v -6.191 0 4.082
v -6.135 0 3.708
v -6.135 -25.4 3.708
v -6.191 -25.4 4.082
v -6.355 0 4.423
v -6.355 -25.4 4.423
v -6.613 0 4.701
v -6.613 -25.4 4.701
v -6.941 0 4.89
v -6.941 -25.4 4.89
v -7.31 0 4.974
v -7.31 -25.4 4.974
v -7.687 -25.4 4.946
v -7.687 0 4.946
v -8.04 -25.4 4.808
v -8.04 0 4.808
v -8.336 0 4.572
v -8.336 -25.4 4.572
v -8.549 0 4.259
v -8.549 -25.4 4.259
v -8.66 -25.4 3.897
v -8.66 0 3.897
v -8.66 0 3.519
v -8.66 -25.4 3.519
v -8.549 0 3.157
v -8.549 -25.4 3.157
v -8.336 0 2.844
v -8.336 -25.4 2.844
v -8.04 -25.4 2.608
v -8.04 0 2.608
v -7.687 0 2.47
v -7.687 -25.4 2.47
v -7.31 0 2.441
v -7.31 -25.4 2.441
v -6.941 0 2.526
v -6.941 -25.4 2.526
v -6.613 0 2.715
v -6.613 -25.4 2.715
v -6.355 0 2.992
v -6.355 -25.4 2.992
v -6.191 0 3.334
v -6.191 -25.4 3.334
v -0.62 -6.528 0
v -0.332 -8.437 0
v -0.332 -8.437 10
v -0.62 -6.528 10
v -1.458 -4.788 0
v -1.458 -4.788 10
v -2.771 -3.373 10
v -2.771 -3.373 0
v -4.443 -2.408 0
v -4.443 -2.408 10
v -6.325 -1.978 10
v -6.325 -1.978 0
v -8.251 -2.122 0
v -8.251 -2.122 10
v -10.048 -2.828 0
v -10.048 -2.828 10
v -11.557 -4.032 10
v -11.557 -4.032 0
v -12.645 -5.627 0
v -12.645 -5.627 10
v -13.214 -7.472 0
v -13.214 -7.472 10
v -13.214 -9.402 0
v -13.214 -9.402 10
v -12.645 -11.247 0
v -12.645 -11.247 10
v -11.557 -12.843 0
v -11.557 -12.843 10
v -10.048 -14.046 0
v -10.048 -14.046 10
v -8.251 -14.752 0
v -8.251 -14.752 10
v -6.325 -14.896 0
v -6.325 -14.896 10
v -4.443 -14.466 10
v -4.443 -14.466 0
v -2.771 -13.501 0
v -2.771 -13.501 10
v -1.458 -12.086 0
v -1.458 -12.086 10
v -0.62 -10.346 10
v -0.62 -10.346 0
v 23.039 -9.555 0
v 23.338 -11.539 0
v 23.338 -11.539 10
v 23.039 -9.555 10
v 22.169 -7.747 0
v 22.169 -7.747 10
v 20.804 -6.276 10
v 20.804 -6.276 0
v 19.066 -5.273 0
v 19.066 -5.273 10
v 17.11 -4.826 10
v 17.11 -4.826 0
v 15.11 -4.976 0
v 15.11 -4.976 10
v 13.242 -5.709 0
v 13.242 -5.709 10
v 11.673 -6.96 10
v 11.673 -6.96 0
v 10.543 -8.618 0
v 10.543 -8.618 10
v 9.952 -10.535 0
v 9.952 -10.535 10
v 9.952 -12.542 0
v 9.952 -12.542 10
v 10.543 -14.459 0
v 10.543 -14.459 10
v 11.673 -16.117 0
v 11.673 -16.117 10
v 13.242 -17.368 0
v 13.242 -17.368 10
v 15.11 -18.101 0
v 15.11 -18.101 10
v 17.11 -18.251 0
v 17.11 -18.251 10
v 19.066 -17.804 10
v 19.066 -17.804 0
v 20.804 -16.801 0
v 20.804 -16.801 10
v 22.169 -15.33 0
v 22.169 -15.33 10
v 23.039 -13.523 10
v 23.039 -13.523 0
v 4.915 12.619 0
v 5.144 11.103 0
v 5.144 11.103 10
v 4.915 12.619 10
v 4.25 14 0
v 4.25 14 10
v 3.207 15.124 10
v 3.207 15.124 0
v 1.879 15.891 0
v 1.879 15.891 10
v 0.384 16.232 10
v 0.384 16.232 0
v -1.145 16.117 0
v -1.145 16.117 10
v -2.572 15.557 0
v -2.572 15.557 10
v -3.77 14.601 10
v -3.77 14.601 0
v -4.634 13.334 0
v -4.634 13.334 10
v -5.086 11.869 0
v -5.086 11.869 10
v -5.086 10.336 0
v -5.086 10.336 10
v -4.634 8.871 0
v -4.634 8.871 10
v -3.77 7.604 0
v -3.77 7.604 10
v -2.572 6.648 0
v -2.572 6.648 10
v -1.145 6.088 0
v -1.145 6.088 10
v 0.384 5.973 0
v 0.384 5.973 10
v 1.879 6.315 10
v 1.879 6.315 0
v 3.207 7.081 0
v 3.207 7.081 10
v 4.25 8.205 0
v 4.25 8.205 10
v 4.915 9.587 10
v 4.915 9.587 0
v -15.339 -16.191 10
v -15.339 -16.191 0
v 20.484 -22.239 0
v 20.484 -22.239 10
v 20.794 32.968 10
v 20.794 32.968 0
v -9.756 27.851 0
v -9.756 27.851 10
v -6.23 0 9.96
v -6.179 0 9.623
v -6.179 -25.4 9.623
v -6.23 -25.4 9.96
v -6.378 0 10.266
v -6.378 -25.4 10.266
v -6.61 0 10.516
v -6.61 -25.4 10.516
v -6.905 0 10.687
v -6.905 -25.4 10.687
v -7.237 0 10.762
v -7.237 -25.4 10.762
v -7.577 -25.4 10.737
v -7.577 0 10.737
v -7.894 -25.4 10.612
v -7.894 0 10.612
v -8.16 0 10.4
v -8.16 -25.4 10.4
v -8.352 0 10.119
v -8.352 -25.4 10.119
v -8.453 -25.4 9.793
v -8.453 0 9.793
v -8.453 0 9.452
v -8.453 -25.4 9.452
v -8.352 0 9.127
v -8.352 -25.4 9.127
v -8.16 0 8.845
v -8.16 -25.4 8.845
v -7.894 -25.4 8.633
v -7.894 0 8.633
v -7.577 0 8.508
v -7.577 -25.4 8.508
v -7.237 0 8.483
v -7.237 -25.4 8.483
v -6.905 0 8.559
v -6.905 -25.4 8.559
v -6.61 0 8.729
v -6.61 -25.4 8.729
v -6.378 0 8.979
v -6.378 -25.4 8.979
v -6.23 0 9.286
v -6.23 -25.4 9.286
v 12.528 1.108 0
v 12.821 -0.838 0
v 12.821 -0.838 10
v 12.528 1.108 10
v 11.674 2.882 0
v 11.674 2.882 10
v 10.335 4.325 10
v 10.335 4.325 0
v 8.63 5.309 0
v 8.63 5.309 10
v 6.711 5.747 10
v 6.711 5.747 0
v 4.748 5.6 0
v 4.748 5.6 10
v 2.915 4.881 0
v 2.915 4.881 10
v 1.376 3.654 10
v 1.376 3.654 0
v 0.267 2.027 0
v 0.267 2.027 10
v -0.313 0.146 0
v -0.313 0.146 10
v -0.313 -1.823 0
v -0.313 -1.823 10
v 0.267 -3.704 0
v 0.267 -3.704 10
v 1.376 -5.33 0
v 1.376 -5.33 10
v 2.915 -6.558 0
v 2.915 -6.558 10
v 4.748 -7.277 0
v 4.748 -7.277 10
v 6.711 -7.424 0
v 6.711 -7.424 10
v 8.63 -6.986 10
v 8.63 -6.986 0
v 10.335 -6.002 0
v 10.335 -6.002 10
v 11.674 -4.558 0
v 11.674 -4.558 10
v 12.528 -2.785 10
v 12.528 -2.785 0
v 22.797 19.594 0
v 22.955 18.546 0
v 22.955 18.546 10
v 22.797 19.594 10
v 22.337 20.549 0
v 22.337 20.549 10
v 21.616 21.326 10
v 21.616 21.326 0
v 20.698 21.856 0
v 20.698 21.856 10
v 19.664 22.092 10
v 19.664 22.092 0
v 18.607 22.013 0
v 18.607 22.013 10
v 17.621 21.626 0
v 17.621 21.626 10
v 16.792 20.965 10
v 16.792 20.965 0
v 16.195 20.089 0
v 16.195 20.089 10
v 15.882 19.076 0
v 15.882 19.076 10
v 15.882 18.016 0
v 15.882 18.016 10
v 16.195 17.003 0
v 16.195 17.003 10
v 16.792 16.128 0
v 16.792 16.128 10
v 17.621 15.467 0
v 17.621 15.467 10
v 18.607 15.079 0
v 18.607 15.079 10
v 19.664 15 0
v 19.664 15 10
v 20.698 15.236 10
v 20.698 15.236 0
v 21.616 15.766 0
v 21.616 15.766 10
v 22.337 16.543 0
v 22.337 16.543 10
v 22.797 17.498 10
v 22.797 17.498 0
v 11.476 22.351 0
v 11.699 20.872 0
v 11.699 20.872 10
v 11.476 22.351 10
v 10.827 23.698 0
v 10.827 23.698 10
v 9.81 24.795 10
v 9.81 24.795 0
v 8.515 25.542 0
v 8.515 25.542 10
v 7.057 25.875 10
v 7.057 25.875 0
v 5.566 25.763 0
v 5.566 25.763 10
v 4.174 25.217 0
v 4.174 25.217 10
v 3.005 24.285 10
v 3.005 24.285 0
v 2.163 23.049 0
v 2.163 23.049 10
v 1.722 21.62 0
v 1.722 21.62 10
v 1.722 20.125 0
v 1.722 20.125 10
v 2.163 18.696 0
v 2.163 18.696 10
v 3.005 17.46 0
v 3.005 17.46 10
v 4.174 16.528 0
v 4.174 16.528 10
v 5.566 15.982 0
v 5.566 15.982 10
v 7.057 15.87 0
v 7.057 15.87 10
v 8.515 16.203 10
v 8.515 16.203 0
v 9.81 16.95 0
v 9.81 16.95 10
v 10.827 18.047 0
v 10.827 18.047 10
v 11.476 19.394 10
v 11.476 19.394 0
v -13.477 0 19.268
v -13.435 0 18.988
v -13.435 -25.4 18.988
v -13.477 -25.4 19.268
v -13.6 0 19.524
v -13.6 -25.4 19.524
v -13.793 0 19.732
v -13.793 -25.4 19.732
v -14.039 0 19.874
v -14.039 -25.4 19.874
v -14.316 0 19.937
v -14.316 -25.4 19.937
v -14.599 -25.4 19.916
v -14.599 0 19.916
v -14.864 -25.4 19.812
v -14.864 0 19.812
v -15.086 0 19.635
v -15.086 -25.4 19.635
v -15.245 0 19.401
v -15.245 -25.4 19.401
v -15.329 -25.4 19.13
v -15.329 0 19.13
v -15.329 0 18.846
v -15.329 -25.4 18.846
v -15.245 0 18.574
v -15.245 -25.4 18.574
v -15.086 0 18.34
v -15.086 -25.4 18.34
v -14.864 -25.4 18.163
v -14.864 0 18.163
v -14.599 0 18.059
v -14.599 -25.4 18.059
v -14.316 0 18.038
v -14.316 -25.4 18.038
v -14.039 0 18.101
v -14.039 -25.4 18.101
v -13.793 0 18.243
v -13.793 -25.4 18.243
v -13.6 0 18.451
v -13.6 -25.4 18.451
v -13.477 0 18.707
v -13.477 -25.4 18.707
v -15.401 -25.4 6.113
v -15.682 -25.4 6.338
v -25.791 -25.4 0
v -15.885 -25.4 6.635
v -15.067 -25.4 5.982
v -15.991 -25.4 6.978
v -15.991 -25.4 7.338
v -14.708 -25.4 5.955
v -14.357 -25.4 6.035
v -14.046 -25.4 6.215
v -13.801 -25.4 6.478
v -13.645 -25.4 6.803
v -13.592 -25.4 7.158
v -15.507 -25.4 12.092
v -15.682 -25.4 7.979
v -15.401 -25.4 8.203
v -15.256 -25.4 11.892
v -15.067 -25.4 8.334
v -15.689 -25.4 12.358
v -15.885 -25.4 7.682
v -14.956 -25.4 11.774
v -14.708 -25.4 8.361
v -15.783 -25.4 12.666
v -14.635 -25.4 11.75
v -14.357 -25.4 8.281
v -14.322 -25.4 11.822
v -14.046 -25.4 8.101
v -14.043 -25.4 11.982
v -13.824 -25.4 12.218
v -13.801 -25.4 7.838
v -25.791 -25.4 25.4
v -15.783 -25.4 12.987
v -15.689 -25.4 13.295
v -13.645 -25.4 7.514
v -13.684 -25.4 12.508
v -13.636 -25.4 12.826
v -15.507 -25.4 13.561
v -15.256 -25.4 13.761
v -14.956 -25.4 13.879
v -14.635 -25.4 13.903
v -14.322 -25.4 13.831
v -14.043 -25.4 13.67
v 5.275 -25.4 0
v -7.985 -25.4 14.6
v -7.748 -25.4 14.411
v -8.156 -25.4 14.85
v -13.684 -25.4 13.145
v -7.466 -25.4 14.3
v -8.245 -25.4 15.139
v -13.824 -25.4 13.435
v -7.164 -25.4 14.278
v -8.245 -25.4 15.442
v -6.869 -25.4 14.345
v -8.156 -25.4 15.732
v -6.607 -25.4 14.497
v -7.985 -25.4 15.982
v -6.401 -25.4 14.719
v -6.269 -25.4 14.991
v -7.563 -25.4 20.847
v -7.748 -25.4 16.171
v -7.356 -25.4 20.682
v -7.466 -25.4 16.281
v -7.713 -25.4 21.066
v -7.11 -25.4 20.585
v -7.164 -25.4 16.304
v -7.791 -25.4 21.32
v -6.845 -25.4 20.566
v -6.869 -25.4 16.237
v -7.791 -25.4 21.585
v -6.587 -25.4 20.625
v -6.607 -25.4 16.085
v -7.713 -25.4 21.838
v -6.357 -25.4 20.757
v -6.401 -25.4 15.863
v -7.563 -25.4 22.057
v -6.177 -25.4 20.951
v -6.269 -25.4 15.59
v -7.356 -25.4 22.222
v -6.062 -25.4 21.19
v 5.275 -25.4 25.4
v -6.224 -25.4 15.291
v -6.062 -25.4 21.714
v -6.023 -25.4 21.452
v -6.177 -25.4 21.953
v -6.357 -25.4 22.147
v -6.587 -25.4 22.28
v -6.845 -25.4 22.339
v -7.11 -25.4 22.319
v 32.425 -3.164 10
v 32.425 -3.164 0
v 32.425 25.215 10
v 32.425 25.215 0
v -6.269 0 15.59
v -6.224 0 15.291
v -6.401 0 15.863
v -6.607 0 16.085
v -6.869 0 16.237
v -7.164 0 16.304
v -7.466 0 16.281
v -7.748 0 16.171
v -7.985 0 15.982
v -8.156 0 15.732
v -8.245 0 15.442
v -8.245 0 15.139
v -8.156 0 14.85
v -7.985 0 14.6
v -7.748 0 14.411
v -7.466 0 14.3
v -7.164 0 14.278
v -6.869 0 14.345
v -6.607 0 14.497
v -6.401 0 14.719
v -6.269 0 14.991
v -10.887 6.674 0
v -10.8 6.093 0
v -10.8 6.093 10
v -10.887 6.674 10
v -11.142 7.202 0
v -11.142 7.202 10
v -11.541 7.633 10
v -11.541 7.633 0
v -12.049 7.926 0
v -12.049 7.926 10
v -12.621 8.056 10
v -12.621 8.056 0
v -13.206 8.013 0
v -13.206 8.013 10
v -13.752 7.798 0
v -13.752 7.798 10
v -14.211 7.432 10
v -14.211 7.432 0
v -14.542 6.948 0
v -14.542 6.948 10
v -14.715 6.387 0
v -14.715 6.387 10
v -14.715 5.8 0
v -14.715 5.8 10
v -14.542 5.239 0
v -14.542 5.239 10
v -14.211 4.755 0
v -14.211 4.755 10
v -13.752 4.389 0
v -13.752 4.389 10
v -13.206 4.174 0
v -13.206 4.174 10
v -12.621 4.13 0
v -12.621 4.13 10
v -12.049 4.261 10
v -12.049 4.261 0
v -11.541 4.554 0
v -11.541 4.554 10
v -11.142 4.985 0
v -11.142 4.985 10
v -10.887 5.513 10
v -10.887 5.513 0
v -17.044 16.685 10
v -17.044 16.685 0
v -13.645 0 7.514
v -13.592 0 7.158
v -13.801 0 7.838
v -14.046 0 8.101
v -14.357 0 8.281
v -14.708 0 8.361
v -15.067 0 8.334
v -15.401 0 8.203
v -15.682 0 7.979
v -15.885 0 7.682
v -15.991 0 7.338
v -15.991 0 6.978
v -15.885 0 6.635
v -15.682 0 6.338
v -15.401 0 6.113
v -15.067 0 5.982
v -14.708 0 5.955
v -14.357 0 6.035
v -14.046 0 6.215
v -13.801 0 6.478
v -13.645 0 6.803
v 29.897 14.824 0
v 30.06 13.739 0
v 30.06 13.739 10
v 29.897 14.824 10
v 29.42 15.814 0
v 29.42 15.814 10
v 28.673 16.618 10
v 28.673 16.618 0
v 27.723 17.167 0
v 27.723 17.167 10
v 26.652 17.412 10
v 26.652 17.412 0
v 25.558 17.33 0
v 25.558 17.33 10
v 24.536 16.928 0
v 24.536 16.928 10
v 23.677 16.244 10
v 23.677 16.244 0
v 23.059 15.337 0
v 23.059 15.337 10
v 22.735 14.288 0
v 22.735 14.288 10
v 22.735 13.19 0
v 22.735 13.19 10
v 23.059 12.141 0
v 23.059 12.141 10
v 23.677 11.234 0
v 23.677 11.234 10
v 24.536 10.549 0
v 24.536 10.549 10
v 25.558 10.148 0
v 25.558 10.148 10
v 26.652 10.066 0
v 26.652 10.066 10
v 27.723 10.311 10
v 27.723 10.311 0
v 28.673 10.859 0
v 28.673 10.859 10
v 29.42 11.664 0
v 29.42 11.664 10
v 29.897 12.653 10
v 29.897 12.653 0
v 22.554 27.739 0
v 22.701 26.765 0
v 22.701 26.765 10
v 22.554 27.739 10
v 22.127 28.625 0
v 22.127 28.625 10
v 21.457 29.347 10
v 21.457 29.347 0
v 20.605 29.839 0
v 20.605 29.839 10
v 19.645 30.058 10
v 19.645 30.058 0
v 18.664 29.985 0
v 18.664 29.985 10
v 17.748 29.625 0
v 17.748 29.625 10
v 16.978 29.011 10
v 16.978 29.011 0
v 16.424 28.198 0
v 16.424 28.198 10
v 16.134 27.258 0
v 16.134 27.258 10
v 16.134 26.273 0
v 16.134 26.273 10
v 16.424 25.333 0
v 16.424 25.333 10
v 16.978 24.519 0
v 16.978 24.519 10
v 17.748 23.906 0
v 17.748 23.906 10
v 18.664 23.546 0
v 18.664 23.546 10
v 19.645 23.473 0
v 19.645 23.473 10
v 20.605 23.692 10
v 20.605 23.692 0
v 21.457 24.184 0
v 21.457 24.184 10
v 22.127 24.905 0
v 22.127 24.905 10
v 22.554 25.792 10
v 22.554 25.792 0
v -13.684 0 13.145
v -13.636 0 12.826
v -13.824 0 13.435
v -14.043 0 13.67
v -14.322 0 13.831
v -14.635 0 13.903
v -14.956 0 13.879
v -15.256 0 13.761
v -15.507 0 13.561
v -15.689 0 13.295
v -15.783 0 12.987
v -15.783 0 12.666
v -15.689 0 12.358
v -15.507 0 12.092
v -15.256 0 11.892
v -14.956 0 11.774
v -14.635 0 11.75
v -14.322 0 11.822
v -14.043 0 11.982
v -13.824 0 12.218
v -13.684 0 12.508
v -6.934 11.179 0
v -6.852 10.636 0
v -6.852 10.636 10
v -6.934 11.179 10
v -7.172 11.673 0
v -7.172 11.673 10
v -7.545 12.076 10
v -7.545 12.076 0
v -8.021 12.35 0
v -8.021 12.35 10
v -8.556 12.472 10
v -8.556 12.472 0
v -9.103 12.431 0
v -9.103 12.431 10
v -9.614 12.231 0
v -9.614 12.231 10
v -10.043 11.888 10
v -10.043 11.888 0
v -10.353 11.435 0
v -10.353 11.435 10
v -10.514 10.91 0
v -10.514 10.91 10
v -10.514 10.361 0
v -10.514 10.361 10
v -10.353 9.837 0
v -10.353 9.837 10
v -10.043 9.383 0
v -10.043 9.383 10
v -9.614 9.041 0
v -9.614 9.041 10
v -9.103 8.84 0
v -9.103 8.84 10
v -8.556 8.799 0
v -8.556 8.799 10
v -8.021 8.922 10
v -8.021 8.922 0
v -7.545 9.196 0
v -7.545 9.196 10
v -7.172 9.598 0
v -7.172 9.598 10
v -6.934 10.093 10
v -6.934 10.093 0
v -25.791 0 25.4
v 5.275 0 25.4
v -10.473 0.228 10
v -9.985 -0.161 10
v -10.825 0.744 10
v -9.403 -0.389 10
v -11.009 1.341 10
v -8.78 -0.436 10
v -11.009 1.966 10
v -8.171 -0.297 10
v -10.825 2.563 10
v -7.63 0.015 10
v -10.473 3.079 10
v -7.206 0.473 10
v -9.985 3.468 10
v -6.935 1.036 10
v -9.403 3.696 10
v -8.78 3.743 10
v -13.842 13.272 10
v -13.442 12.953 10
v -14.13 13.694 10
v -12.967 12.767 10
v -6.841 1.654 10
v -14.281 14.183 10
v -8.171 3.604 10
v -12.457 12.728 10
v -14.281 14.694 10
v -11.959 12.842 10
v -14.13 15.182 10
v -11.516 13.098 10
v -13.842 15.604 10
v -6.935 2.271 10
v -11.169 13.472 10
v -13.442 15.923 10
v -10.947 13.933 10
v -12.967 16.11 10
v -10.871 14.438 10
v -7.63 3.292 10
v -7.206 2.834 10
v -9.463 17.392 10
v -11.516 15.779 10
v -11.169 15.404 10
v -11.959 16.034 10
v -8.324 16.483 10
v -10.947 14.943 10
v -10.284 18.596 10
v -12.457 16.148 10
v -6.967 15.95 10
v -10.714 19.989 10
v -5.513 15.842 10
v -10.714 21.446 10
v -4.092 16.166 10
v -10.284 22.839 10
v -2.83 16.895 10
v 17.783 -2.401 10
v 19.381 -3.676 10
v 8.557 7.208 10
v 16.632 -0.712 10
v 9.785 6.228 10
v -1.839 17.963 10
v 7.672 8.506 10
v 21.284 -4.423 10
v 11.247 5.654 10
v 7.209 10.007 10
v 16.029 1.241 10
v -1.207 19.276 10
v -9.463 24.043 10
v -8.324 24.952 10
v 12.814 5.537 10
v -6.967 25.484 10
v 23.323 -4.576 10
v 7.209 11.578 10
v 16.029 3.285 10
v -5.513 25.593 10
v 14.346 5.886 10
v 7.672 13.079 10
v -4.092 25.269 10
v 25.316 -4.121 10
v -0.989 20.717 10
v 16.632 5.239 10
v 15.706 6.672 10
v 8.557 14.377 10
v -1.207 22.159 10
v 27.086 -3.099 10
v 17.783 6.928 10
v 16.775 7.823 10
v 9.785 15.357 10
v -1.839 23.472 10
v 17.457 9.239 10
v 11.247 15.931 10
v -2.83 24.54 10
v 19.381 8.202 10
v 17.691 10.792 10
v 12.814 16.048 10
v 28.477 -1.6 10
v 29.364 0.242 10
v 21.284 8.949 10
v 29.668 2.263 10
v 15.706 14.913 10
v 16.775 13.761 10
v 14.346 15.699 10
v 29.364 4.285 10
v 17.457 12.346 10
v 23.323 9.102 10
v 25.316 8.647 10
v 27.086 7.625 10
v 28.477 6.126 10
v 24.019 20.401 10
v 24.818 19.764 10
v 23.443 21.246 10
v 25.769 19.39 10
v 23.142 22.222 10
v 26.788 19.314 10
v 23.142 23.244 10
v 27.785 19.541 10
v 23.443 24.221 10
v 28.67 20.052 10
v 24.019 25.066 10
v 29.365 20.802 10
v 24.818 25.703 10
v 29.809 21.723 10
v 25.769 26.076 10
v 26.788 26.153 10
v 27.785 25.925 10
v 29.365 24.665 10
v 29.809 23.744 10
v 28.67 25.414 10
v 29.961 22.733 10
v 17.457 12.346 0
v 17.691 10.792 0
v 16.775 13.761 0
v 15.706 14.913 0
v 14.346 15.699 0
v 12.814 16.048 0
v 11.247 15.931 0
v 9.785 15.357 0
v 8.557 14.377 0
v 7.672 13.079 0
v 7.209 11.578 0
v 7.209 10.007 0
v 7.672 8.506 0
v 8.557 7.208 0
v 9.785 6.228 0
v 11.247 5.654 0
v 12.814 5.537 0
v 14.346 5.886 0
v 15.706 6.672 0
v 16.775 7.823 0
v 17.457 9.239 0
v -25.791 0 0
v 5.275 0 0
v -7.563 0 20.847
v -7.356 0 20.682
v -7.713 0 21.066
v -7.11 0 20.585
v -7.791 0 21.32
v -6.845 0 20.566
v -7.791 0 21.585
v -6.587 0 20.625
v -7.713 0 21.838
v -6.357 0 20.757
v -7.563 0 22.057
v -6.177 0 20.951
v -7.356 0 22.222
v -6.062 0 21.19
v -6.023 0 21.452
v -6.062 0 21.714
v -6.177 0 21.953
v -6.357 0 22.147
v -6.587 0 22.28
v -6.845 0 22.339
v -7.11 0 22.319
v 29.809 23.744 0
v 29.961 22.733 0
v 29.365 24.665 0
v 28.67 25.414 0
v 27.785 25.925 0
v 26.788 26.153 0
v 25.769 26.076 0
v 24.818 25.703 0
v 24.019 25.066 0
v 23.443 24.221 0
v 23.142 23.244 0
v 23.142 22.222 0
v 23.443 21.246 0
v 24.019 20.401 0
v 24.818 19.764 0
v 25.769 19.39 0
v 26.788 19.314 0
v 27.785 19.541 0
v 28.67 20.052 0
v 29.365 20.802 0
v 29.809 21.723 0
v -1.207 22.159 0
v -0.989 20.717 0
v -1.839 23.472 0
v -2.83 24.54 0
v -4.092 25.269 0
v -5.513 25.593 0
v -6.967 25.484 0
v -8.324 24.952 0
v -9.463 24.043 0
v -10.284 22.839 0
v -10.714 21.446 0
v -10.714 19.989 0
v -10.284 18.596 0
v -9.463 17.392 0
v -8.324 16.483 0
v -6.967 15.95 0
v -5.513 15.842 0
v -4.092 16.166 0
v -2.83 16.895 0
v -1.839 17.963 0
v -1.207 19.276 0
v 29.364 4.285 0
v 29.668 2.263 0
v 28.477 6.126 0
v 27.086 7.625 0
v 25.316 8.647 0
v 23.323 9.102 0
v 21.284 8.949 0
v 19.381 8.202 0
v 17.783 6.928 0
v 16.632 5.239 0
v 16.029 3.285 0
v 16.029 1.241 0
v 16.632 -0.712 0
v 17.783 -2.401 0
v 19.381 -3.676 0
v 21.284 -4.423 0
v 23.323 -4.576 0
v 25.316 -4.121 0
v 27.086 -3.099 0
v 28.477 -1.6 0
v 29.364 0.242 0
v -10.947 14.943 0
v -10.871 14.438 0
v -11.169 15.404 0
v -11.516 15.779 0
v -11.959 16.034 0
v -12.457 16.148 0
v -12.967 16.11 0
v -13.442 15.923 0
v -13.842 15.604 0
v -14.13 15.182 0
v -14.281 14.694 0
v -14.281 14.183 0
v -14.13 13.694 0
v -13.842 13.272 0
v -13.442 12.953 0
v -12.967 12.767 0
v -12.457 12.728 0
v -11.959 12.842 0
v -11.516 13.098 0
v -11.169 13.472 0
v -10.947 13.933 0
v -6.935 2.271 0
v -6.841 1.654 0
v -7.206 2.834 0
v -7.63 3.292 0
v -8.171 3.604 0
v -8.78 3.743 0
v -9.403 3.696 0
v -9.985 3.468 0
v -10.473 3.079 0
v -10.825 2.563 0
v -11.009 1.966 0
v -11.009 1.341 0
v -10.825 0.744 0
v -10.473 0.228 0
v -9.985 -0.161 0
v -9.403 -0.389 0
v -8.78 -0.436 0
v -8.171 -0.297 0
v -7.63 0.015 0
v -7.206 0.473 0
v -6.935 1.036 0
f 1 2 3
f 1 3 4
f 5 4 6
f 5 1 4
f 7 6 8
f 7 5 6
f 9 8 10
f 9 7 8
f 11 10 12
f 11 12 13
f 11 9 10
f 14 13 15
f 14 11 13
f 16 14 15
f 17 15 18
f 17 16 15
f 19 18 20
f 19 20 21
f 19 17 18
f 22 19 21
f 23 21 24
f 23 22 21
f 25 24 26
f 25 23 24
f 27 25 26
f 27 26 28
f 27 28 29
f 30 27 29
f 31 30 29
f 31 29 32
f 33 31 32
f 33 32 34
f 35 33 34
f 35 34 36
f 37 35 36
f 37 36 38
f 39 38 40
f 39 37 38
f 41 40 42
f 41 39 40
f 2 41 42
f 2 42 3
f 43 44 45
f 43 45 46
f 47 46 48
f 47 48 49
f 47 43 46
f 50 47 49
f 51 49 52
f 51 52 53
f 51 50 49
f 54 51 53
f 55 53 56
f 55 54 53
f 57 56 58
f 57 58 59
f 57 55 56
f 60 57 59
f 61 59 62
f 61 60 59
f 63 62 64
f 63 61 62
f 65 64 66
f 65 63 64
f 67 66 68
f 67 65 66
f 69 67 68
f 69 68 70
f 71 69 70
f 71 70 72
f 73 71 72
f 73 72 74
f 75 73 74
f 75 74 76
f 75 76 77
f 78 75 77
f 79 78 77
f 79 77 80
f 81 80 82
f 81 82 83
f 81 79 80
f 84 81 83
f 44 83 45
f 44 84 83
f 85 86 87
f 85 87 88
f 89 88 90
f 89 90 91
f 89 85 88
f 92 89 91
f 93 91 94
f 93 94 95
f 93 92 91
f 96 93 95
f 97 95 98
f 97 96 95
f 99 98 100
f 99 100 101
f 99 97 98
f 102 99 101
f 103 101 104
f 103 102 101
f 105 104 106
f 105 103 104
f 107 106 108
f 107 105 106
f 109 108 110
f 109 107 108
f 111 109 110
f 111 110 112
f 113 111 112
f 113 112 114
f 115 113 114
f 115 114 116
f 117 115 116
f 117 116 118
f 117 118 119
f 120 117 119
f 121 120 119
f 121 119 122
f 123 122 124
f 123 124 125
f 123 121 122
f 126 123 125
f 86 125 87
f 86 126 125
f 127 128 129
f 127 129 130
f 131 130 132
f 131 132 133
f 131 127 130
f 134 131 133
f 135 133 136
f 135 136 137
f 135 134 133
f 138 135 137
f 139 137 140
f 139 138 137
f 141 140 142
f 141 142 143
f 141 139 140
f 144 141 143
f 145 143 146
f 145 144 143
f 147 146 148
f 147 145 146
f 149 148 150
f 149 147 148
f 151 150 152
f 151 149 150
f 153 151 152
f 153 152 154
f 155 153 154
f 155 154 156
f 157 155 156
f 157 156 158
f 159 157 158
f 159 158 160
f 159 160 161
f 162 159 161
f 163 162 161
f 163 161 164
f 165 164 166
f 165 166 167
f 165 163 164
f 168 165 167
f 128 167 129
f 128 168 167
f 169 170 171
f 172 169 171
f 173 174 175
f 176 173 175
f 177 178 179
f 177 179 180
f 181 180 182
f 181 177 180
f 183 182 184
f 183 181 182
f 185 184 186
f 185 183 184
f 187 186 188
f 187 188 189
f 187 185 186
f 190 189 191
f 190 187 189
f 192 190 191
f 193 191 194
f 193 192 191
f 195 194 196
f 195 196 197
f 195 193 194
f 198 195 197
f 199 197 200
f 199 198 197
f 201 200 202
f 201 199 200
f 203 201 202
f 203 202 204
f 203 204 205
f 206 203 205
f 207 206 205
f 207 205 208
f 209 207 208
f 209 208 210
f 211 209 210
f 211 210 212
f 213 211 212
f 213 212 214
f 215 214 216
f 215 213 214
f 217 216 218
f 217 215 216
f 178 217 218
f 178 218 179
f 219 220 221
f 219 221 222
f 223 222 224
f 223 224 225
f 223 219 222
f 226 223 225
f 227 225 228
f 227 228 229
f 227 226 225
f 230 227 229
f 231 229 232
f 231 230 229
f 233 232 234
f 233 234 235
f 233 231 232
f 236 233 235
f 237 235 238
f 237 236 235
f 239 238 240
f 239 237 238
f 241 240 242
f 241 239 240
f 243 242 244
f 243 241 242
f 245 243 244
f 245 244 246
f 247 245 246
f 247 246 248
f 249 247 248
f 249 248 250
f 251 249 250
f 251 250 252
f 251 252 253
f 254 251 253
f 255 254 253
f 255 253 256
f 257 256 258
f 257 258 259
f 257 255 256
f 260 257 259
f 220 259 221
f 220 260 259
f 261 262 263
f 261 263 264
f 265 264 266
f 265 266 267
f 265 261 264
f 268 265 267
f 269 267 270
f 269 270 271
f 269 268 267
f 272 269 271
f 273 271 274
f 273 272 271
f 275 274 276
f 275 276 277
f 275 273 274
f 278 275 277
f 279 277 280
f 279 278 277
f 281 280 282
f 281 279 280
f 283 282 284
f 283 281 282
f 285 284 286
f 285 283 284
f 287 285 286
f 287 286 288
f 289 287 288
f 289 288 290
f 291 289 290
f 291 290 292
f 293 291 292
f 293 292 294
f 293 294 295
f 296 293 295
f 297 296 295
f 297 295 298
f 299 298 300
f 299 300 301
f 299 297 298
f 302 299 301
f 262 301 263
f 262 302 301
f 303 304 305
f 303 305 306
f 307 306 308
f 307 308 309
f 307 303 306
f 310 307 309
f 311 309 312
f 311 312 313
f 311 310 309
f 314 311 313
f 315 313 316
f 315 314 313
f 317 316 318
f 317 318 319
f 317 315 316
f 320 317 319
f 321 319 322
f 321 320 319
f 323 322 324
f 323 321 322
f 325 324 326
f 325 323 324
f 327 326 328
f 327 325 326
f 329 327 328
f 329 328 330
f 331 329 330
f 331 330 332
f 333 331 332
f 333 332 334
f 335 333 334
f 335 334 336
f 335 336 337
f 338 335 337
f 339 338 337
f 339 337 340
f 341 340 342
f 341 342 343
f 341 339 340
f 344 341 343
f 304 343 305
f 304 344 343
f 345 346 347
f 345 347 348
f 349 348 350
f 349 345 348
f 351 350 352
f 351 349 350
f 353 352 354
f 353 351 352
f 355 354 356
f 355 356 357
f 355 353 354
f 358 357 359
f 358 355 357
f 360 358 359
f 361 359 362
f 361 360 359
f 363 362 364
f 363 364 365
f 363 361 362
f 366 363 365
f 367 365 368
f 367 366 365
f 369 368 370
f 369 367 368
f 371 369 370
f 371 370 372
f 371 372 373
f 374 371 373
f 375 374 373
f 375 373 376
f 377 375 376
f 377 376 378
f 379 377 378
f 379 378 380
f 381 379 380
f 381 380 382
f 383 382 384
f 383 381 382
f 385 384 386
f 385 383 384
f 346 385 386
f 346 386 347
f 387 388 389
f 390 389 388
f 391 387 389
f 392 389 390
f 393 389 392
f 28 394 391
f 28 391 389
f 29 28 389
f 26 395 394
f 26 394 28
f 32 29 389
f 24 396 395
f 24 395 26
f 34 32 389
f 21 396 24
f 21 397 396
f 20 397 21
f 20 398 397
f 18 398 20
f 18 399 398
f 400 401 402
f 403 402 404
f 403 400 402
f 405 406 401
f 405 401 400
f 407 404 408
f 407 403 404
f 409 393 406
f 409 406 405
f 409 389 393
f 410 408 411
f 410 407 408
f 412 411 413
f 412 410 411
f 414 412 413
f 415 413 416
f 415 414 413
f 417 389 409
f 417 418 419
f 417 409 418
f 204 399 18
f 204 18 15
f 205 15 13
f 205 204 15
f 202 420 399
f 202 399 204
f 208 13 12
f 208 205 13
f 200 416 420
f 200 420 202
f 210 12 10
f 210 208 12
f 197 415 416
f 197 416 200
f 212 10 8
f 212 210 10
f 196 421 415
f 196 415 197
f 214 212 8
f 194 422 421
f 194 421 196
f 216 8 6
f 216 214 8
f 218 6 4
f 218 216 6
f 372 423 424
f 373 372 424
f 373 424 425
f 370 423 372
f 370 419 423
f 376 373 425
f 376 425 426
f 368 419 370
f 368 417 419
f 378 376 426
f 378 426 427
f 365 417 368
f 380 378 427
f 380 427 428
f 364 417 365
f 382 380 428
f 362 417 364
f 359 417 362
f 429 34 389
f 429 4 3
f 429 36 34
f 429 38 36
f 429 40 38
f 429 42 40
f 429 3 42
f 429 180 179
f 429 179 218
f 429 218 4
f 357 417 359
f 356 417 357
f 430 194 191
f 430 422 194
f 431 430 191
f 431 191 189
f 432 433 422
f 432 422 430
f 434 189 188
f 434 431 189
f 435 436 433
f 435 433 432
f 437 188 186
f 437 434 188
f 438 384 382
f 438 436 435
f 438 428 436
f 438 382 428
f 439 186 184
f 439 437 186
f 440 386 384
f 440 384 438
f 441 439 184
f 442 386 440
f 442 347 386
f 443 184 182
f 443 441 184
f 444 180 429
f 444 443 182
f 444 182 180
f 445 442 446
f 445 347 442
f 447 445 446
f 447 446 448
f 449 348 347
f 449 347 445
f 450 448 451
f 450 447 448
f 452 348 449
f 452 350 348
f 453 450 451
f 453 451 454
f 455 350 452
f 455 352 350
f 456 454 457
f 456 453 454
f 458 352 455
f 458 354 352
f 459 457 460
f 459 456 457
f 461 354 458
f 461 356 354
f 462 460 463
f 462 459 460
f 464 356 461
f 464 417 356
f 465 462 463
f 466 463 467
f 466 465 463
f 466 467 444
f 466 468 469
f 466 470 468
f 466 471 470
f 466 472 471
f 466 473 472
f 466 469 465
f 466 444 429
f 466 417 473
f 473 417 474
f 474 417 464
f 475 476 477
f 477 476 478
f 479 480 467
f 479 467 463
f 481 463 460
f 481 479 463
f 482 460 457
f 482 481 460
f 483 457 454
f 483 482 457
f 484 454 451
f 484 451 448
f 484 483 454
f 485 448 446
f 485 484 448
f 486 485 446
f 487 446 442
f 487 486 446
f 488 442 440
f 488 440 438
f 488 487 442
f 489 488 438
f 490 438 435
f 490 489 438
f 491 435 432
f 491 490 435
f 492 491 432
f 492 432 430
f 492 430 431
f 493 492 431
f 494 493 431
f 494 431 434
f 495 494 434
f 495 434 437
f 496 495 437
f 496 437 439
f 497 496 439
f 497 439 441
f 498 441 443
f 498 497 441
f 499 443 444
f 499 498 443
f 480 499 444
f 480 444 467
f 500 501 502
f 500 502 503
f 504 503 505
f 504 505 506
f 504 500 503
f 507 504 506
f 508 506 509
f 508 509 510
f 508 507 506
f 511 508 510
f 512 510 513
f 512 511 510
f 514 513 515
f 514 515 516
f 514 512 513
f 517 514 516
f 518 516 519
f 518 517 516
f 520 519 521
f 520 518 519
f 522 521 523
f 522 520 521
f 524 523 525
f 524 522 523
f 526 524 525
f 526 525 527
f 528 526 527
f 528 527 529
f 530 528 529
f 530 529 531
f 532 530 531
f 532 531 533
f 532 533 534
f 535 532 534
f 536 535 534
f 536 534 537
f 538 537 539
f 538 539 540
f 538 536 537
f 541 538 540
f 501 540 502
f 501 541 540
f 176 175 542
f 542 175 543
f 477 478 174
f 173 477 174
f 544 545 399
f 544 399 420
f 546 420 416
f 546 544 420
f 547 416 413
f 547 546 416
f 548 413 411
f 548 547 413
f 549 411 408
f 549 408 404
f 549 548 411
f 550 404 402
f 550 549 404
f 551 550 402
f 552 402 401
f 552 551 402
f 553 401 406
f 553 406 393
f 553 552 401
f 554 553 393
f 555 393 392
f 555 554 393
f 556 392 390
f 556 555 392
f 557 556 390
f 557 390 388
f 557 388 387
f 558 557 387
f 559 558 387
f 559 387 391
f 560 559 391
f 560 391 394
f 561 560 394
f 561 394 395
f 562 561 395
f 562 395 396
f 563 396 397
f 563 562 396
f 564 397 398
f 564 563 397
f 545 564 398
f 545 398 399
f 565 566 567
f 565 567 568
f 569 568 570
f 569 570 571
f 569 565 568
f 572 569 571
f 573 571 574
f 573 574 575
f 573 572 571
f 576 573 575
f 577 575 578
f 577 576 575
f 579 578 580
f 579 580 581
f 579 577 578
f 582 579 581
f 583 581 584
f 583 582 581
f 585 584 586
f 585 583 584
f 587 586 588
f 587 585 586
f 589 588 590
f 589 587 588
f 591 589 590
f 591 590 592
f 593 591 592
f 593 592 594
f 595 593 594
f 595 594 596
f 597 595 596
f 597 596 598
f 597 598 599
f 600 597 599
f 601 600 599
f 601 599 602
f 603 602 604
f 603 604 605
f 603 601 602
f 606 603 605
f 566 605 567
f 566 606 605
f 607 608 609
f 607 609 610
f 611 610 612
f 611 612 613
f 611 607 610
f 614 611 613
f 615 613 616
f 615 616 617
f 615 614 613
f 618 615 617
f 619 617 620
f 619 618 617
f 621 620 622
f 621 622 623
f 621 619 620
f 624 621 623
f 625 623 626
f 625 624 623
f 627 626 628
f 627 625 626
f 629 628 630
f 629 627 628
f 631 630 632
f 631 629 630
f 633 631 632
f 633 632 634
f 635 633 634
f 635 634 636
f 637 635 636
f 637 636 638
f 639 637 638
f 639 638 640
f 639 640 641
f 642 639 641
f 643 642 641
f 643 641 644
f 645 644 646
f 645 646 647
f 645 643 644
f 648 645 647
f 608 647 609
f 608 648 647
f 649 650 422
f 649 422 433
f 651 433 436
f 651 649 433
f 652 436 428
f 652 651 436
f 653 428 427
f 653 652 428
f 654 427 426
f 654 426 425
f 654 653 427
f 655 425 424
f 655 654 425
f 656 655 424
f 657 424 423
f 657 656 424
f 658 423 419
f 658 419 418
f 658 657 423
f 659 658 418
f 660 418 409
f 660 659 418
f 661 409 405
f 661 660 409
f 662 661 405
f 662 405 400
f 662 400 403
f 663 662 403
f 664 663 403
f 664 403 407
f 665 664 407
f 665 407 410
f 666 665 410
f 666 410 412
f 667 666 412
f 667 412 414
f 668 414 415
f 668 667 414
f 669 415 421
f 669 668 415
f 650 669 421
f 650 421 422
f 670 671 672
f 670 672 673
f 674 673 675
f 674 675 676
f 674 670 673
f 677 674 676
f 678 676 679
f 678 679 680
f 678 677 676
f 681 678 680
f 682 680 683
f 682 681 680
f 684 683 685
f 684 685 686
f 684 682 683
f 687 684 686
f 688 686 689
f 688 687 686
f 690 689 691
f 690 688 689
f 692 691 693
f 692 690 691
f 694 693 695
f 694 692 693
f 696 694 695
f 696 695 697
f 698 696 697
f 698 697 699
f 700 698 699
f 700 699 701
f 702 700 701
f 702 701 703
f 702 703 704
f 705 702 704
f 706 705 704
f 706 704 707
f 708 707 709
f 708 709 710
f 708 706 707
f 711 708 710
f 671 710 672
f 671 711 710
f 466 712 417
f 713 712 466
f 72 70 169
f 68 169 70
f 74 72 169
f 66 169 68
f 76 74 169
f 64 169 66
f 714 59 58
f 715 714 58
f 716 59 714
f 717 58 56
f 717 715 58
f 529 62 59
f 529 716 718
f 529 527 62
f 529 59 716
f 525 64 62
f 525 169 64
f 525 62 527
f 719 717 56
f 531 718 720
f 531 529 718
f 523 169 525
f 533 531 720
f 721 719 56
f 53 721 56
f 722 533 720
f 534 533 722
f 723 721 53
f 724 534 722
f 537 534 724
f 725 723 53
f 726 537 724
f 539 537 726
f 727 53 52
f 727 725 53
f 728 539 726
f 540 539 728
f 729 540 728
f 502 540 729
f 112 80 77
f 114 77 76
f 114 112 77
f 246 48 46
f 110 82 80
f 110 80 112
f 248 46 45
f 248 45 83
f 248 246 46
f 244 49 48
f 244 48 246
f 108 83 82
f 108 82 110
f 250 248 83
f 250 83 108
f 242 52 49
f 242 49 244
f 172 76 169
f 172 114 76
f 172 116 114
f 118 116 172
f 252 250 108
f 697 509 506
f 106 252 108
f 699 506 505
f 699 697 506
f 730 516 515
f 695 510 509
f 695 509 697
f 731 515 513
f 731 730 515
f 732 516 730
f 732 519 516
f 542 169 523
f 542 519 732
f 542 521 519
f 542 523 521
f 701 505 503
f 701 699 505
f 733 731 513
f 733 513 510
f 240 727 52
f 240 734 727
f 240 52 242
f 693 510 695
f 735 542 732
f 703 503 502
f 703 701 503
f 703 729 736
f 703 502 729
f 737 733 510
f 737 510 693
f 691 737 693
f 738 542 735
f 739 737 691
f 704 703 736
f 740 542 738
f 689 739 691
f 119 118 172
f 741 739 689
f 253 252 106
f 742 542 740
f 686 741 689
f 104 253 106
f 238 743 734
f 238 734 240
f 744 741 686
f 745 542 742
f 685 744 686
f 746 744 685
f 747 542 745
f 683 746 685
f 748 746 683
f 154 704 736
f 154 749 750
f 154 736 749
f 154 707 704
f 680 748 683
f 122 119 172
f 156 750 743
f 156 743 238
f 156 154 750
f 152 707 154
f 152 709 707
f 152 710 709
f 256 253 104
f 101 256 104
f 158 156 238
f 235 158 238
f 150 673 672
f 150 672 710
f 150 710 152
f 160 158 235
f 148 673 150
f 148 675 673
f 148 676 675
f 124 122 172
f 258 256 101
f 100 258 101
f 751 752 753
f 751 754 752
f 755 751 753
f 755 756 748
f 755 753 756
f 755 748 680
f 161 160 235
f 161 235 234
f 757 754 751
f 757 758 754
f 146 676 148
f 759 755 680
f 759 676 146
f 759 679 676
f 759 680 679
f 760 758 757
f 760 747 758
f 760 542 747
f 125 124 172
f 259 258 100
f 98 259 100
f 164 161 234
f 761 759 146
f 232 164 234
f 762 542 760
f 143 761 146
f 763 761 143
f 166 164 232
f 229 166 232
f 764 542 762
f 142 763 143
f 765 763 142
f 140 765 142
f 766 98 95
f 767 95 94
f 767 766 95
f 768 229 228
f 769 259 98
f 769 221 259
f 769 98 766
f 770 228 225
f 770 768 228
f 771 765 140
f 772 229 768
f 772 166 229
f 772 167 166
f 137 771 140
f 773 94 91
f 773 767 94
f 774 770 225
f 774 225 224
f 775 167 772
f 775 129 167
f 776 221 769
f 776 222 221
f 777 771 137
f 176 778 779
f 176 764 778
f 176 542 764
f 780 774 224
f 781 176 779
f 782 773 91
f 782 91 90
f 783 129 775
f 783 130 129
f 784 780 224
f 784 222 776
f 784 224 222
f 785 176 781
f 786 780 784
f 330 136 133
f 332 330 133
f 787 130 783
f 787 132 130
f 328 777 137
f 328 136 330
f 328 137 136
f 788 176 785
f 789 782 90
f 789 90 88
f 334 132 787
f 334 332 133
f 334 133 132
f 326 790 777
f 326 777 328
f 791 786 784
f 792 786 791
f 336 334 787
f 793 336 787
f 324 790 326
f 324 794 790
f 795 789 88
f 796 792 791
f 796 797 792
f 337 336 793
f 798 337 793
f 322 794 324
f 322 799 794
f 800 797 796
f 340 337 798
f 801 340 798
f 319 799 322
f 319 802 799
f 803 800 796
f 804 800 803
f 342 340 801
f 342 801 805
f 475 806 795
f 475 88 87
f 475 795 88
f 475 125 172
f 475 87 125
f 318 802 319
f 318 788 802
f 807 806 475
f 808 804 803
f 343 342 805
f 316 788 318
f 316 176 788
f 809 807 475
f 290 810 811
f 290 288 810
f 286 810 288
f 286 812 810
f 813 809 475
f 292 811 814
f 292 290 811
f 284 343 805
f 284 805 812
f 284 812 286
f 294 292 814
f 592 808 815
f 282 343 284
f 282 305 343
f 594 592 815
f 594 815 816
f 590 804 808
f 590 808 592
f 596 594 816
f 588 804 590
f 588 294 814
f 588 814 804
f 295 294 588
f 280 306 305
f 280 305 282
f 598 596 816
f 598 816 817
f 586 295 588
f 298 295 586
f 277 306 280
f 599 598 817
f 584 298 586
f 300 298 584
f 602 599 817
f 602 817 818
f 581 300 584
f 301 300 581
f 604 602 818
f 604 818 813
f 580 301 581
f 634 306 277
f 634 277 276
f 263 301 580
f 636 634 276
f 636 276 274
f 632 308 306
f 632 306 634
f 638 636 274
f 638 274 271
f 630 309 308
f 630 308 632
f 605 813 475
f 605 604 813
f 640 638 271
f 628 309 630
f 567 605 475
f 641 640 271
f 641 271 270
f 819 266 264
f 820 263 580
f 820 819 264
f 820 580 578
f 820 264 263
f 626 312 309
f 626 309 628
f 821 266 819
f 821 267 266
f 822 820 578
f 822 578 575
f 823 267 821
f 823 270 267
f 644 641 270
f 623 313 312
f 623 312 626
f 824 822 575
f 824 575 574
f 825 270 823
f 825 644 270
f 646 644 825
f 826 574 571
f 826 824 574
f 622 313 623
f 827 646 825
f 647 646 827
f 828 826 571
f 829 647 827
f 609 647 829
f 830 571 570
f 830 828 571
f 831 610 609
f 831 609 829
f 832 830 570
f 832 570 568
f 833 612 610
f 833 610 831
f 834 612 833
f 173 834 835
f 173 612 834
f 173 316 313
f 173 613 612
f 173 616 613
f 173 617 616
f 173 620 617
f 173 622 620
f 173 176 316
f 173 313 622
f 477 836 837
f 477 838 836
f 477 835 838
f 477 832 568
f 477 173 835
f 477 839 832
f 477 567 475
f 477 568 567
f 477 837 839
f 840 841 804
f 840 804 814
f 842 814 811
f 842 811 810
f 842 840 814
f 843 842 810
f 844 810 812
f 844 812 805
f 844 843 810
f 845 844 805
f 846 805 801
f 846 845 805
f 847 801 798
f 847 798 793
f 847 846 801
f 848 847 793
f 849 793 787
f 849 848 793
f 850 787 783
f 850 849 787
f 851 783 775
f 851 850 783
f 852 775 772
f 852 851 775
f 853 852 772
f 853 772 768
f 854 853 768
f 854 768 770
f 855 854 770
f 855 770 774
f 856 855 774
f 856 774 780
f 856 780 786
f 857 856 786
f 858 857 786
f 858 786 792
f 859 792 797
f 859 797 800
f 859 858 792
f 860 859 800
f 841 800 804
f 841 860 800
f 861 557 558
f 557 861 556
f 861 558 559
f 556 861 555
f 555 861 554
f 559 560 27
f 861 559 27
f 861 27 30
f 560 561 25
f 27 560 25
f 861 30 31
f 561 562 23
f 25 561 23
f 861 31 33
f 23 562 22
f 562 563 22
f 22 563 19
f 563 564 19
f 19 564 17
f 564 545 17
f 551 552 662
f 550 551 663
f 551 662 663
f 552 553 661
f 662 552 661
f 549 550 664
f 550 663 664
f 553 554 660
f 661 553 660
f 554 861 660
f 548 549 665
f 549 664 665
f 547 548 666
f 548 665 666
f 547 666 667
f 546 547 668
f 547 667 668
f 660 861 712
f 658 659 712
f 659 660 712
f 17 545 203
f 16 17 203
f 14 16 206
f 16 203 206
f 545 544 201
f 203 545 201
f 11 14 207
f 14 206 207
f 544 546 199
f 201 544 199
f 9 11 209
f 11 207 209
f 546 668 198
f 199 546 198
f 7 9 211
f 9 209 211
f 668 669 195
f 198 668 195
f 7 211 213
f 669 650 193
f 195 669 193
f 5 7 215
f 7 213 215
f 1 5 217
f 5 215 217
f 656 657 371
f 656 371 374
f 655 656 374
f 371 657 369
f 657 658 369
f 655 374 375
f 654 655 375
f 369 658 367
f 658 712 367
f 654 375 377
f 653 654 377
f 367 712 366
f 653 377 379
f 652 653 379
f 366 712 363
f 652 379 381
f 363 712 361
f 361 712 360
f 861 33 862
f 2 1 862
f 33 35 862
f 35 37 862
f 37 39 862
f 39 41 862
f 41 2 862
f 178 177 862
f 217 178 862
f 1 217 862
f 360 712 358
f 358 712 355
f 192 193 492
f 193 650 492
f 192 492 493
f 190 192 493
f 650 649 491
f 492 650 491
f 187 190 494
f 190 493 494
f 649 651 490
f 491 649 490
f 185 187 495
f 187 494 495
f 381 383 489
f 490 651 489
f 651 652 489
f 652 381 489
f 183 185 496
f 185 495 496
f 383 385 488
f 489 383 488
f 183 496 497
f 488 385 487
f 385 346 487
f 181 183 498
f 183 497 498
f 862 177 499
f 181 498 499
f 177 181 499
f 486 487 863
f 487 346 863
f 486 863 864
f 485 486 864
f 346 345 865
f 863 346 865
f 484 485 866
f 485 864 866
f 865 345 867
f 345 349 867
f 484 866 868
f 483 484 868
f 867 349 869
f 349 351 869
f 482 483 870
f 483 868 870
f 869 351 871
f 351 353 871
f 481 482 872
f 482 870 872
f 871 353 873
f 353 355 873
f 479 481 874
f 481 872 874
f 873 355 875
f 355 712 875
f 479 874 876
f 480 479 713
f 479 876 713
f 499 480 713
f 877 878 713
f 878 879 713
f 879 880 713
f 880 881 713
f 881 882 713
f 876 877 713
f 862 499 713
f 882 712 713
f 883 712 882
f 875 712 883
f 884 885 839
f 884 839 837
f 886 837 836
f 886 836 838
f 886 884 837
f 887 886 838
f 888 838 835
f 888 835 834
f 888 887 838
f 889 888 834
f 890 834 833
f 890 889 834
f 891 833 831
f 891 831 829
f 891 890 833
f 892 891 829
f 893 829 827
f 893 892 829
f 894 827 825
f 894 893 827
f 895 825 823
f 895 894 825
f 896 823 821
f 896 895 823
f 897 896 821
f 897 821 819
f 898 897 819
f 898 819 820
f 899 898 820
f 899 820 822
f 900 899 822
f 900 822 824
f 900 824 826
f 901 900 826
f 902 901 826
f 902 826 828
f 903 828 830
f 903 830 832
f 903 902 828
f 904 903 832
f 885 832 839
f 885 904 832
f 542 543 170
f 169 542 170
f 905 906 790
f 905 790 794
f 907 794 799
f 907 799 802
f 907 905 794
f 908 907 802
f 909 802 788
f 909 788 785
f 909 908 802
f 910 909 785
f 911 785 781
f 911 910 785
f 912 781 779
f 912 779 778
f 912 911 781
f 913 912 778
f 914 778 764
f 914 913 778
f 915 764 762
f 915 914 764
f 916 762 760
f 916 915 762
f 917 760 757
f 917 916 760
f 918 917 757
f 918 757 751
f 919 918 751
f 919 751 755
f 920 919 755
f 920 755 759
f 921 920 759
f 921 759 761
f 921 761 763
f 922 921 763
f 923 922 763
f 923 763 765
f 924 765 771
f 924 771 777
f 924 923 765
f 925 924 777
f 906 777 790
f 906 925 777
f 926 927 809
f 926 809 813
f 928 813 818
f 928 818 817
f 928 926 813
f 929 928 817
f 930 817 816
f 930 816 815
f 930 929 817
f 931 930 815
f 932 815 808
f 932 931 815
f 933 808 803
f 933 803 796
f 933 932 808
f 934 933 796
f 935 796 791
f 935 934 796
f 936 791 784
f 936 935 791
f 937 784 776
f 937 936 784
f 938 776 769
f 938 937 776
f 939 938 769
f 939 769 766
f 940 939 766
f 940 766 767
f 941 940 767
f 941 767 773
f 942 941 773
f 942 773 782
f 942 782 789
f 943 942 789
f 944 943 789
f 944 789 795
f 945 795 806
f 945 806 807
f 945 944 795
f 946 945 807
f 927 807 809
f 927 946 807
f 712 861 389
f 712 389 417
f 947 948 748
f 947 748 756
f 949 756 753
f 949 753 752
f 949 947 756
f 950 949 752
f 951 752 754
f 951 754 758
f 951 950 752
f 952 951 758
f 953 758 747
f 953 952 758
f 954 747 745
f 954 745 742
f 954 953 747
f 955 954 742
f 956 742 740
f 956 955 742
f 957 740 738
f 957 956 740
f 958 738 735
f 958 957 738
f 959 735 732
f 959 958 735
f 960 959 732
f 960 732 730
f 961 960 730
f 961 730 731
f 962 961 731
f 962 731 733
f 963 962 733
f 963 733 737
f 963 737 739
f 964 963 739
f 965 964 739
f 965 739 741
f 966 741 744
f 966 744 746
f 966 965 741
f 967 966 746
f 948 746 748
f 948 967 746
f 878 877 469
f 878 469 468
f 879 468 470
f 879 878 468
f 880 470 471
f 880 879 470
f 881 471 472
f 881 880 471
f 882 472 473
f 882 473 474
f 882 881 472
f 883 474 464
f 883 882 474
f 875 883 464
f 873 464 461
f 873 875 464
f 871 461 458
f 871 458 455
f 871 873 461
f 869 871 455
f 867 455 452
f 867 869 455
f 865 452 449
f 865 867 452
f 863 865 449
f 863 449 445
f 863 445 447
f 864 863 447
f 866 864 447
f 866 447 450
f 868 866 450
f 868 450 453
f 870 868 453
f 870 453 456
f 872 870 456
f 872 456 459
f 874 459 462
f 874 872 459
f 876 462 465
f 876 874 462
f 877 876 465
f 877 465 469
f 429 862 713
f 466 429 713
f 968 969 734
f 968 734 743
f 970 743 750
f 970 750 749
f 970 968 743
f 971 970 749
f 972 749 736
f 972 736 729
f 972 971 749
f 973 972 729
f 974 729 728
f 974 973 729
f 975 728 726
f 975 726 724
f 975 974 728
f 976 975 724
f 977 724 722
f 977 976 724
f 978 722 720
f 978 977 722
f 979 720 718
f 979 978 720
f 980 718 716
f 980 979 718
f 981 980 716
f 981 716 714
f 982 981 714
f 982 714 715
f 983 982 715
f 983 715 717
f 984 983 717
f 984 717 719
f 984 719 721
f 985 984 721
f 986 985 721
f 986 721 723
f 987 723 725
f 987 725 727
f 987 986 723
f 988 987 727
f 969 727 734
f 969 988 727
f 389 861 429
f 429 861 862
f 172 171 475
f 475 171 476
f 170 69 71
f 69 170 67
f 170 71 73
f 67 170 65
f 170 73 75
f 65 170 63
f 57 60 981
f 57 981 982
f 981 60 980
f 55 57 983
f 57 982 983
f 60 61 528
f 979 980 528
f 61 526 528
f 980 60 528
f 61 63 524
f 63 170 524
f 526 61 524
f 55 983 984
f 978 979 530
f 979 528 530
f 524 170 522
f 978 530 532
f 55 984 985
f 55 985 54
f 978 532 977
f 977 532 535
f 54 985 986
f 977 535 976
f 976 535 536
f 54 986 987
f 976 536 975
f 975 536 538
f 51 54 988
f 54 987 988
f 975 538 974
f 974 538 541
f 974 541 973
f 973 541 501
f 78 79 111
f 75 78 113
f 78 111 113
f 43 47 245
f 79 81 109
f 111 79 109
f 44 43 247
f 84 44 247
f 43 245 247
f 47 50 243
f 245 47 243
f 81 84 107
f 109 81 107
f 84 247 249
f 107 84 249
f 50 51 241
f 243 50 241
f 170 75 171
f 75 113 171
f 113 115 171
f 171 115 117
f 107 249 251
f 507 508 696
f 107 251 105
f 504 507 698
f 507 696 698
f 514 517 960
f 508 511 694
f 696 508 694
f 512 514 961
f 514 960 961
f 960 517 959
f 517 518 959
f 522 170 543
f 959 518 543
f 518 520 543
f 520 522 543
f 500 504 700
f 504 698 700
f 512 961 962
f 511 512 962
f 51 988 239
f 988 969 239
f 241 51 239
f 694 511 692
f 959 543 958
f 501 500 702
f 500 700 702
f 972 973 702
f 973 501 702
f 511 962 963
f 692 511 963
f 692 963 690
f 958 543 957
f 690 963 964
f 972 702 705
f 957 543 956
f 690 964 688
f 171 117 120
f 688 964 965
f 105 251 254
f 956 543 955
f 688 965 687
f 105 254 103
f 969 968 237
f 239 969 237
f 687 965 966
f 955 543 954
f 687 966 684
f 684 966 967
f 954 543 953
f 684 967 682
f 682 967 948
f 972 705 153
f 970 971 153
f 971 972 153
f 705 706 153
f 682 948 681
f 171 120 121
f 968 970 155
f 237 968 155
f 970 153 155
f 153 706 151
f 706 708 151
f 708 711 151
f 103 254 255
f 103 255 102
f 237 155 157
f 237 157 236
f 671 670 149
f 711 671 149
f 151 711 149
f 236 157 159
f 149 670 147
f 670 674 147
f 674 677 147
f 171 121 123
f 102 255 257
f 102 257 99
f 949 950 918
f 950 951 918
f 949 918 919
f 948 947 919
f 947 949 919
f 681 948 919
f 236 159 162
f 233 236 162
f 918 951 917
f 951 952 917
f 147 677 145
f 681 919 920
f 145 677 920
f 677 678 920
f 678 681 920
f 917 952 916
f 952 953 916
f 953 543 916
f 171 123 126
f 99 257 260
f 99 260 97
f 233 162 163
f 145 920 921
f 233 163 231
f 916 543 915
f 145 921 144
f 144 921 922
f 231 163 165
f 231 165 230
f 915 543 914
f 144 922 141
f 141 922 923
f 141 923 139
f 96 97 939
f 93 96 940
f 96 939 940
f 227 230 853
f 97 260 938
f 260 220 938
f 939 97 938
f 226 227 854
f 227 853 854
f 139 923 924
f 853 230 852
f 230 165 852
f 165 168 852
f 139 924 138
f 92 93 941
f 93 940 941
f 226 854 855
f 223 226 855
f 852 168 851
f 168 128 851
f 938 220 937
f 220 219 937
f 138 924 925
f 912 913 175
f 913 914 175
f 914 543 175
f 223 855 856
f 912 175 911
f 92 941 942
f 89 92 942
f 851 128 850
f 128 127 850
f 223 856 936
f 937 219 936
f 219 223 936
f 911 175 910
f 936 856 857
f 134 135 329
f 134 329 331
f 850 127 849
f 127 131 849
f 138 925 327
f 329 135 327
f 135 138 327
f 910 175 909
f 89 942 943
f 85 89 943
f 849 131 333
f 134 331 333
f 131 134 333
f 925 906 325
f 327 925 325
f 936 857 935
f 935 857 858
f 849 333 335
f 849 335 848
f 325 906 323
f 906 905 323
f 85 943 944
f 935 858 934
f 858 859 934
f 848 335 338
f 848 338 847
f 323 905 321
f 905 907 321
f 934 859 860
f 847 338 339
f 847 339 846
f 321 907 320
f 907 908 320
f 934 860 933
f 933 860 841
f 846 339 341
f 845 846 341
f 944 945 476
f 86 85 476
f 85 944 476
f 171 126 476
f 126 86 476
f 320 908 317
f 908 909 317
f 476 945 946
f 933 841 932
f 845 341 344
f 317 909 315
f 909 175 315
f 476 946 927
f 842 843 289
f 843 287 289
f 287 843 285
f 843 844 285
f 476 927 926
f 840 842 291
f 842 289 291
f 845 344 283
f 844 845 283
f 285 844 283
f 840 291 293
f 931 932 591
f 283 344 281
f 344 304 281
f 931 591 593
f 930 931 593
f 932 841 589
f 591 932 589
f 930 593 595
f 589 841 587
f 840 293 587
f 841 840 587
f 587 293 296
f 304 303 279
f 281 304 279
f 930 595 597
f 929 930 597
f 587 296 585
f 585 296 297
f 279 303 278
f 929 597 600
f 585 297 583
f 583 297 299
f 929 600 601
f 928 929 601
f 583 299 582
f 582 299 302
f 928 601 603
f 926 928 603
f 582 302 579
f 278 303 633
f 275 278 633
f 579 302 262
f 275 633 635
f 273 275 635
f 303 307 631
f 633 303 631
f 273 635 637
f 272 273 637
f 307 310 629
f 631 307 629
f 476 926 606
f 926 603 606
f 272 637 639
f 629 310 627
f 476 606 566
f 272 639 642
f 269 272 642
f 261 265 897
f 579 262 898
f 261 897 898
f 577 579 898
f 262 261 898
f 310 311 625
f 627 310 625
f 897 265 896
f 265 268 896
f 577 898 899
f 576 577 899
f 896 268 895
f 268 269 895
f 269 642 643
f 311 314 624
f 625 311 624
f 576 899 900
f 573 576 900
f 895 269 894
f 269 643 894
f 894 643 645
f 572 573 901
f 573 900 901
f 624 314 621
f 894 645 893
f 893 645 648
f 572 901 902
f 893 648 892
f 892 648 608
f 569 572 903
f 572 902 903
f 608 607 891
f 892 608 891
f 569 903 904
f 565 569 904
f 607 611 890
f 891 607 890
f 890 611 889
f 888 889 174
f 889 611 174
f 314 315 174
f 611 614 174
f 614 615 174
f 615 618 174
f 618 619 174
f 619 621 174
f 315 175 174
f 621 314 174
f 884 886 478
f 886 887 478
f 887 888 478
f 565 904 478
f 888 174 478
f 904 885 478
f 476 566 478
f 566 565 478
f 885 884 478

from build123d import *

# Parameters (mm, degrees)
F0_R     = 6.477
F0_R_2   = 2.0955
F0_R_3   = 6.604
F0_R_4   = 6.731
F0_R_5   = 6.858
F0_R_6   = 1.9685
F0_R_7   = 1.8415
F0_R_8   = 1.7145
F0_R_9   = 5.1435
F0_R_10  = 4.8895
F0_R_11  = 5.0165
F0_R_12  = 5.2705
F0_R_13  = 3.556
F0_R_14  = 3.683
F0_R_15  = 3.302
F0_R_16  = 3.429
F1_DEPTH = 10
F2_W     = 31.066153
F2_H     = 25.4
F2_R     = 1.2065
F2_R_2   = 1.27
F2_R_3   = 1.143
F2_R_4   = 1.0795
F2_R_5   = 0.9525
F2_R_6   = 1.016
F2_R_7   = 0.889
F3_DEPTH = 25.4


with BuildPart() as f1:
    # F0 (on Top) → F1 (new body)
    with BuildSketch(Plane.XY):
        Polygon((-9.755744, 27.850911), (-17.044356, 16.685376), (-15.338511, -16.190922), (20.484246, -22.23892), (32.425169, -3.164464), (32.425169, 25.214603), (20.794399, 32.96845), align=None)
        with Locations((-6.809283, -8.437078)):
            Circle(F0_R, mode=Mode.SUBTRACT)
        with Locations((-8.936937, 1.653538)):
            Circle(F0_R_2, mode=Mode.SUBTRACT)
        with Locations((6.217177, -0.83831)):
            Circle(F0_R_3, mode=Mode.SUBTRACT)
        with Locations((16.607326, -11.538615)):
            Circle(F0_R_4, mode=Mode.SUBTRACT)
        with Locations((22.8104, 2.263227)):
            Circle(F0_R_5, mode=Mode.SUBTRACT)
        with Locations((-12.768192, 6.093469)):
            Circle(F0_R_6, mode=Mode.SUBTRACT)
        with Locations((-8.693385, 10.635814)):
            Circle(F0_R_7, mode=Mode.SUBTRACT)
        with Locations((-12.585197, 14.438136)):
            Circle(F0_R_8, mode=Mode.SUBTRACT)
        with Locations((0, 11.102608)):
            Circle(F0_R_9, mode=Mode.SUBTRACT)
        with Locations((-5.878822, 20.717375)):
            Circle(F0_R_10, mode=Mode.SUBTRACT)
        with Locations((6.682404, 20.872451)):
            Circle(F0_R_11, mode=Mode.SUBTRACT)
        with Locations((12.420249, 10.792454)):
            Circle(F0_R_12, mode=Mode.SUBTRACT)
        with Locations((19.398708, 18.546299)):
            Circle(F0_R_13, mode=Mode.SUBTRACT)
        with Locations((26.377169, 13.738916)):
            Circle(F0_R_14, mode=Mode.SUBTRACT)
        with Locations((19.398708, 26.765374)):
            Circle(F0_R_15, mode=Mode.SUBTRACT)
        with Locations((26.532244, 22.733374)):
            Circle(F0_R_16, mode=Mode.SUBTRACT)
    extrude(amount=F1_DEPTH)


with BuildPart() as f3:
    # F2 (on Front) → F3 (new body)
    with BuildSketch(Plane.XZ):
        with Locations((-10.257691, 12.7)):
            Rectangle(F2_W, F2_H)
        with Locations((-14.798059, 7.158136)):
            Circle(F2_R, mode=Mode.SUBTRACT)
        with Locations((-7.404639, 3.707875)):
            Circle(F2_R_2, mode=Mode.SUBTRACT)
        with Locations((-7.32249, 9.622611)):
            Circle(F2_R_3, mode=Mode.SUBTRACT)
        with Locations((-14.71591, 12.826424)):
            Circle(F2_R_4, mode=Mode.SUBTRACT)
        with Locations((-14.387313, 18.987609)):
            Circle(F2_R_5, mode=Mode.SUBTRACT)
        with Locations((-7.24034, 15.290899)):
            Circle(F2_R_6, mode=Mode.SUBTRACT)
        with Locations((-6.911744, 21.452084)):
            Circle(F2_R_7, mode=Mode.SUBTRACT)
    extrude(amount=F3_DEPTH)


solid = Compound([f1.part, f3.part])
